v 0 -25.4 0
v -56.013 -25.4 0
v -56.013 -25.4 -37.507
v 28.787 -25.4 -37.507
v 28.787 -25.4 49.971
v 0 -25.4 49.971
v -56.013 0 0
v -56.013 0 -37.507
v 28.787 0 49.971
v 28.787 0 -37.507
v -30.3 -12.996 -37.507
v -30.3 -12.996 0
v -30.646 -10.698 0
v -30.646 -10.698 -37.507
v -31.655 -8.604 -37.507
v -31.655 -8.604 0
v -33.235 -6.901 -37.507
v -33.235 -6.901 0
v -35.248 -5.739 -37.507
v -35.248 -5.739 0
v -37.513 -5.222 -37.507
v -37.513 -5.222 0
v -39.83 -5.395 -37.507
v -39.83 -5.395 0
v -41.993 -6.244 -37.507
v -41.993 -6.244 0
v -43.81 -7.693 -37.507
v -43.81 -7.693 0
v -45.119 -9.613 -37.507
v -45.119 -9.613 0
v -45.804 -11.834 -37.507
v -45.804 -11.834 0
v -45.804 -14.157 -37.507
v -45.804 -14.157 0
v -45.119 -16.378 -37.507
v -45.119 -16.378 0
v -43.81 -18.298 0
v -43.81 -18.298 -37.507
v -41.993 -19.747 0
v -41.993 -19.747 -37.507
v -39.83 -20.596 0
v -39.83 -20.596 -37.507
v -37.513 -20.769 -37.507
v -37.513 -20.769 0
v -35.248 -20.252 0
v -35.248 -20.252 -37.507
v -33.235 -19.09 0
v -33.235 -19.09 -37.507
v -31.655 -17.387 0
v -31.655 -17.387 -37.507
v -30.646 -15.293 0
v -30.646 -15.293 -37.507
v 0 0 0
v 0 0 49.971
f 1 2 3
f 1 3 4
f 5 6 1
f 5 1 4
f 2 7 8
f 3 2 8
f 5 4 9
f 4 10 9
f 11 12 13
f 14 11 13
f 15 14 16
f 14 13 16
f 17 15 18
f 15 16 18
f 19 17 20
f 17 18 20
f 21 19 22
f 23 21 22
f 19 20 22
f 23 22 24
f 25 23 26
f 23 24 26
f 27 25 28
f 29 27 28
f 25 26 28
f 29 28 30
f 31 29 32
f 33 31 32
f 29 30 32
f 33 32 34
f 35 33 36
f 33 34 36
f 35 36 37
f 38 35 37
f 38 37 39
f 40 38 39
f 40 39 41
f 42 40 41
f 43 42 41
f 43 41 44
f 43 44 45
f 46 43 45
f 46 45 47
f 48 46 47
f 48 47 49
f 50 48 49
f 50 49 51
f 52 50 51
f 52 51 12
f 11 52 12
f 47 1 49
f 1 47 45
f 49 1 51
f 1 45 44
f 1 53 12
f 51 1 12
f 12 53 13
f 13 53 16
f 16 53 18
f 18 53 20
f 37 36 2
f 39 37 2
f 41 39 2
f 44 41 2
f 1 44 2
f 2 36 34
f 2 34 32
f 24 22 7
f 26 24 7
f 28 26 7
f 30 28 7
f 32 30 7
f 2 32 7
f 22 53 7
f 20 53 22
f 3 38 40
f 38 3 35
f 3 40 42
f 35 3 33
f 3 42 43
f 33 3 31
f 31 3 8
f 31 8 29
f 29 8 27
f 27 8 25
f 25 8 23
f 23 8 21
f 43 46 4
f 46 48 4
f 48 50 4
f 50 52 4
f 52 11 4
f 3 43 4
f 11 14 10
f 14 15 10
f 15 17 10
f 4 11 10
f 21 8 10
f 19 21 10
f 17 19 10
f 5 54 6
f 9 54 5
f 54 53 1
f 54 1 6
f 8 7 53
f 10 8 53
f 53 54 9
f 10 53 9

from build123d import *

# Parameters (mm, degrees)
F0_W     = 28.7874191999
F0_H     = 49.9707609415
F1_DEPTH = 25.4
F2_DEPTH = 25.4
F3_DEPTH = 25.4
F4_DEPTH = 25.4
F5_R     = 7.7956381062
F6_DEPTH = 38.1


with BuildPart() as f1:
    # F0 (on Front) → F1 (new body)
    with BuildSketch(Plane.XZ):
        with Locations((14.3937096, 24.9853804708)):
            Rectangle(F0_W, F0_H)
    extrude(amount=F1_DEPTH)

    # F0 (on Front) → F2 (join)
    with BuildSketch(Plane.XZ):
        with Locations((14.3937096, 24.9853804708)):
            Rectangle(F0_W, F0_H)
        Polygon((-56.0127794743, 0), (-56.0127794743, -37.5073552132), (28.7874191999, -37.5073552132), (28.7874191999, 0), (0, 0), align=None)
    extrude(amount=F2_DEPTH)

    # F3 (cut): a face of the model
    f3_faces = [f1.faces().sort_by_distance(p)[0] for p in [
        (0, -12.7, 24.9853804708),
    ]]
    extrude(f3_faces, amount=-F3_DEPTH, mode=Mode.SUBTRACT)

    # F0 (on Front) → F4 (join)
    with BuildSketch(Plane.XZ):
        with Locations((14.3937096, 24.9853804708)):
            Rectangle(F0_W, F0_H)
    extrude(amount=F4_DEPTH)

    # F5 (on face) → F6 (cut)
    with BuildSketch(Plane.XY):
        with Locations((-38.0956299985, -12.9956078465)):
            Circle(F5_R)
    extrude(amount=-F6_DEPTH, mode=Mode.SUBTRACT)


solid = f1.part
